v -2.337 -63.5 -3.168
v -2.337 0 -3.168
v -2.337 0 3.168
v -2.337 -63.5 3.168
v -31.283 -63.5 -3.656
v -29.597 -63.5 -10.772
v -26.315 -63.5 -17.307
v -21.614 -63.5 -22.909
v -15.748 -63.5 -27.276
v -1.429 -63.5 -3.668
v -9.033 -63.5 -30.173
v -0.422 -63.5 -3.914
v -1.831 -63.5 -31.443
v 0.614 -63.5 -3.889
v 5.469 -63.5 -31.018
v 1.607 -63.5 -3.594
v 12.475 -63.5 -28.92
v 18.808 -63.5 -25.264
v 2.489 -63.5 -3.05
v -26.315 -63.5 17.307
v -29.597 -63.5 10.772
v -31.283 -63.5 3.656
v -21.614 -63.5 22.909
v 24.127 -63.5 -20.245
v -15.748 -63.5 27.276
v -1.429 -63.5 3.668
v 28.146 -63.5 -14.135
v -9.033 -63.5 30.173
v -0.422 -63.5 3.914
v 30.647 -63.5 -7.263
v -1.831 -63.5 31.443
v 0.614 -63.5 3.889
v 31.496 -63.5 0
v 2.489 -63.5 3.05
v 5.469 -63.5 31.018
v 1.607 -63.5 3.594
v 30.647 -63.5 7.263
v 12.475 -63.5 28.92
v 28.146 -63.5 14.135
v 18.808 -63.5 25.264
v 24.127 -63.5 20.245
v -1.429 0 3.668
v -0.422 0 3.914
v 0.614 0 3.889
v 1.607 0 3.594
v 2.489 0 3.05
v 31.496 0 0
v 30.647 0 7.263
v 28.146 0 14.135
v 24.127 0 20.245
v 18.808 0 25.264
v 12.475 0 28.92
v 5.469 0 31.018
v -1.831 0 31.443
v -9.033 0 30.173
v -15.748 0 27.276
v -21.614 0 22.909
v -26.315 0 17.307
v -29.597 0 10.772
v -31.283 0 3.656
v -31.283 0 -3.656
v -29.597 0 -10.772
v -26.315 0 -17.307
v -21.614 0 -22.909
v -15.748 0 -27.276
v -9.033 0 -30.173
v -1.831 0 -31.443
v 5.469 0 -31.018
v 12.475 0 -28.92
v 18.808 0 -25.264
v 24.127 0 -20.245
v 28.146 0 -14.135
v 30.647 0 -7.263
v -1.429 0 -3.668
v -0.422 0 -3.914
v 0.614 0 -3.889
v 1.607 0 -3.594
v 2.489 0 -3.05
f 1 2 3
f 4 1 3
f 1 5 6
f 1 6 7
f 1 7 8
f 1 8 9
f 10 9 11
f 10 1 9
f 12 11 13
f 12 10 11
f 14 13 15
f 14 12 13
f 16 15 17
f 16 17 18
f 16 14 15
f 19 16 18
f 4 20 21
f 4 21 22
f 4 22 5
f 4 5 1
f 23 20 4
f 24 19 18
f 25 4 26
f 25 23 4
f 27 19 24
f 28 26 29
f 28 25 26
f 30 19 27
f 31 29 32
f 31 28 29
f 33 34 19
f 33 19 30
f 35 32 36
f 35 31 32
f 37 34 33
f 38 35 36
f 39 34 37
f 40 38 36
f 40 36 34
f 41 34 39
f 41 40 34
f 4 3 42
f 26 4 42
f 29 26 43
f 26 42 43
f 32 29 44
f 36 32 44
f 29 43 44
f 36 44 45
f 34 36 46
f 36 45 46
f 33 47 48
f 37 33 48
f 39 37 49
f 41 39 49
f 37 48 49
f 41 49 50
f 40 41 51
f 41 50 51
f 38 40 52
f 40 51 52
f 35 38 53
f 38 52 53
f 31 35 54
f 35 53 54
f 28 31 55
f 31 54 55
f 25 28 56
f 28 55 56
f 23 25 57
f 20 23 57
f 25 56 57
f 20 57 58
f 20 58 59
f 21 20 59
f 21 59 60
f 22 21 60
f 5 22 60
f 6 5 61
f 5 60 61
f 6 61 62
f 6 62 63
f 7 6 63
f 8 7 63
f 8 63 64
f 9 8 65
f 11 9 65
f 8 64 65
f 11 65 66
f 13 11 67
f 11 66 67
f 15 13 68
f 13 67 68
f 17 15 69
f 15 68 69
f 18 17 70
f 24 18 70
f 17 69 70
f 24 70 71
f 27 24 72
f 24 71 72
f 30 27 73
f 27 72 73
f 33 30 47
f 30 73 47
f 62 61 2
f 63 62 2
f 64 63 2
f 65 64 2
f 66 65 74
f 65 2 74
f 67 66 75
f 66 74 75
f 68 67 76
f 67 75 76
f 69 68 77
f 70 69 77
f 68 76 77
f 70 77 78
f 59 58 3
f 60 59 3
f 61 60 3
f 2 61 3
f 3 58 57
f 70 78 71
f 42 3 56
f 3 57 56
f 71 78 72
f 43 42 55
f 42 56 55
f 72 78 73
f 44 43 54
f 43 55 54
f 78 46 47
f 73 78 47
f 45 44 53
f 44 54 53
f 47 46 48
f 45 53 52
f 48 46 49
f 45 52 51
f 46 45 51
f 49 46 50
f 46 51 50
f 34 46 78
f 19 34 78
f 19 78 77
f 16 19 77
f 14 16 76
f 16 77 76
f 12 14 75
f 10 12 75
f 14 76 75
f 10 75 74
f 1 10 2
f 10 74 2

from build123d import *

# Parameters (mm, degrees)
F0_R     = 31.496
F1_DEPTH = 63.5
F2_DEPTH = 63.5
F3_DEPTH = 63.5


with BuildPart() as f1:
    # F0 (on Front) → F1 (new body)
    with BuildSketch(Plane.XZ):
        Circle(F0_R)
        with BuildLine():
            ThreePointArc((26.416, 0), (26.1371583003, -3.8280559015), (25.306519989, -7.5752955087))
            ThreePointArc((25.306519989, -7.5752955087), (22.8769270664, -13.208), (19.2136583462, -18.1284414375))
            ThreePointArc((19.2136583462, -18.1284414375), (0, -26.416), (-19.2136583462, -18.1284414375))
            ThreePointArc((-19.2136583462, -18.1284414375), (-22.9056297562, -13.1581602617), (-25.3392663756, -7.4650274981))
            ThreePointArc((-25.3392663756, -7.4650274981), (-22.8481158541, 13.2577772615), (-6.0928613417, 25.7037370176))
            ThreePointArc((-6.0928613417, 25.7037370176), (-4.8286381359, 25.9709320155), (-3.5528613417, 26.175985794))
            ThreePointArc((-3.5528613417, 26.175985794), (17.3774663113, 19.8954447199), (26.416, 0))
        make_face(mode=Mode.SUBTRACT)
    extrude(amount=F1_DEPTH)



with BuildPart() as f2:
    # F0 (on Front) → F2 (new body)
    with BuildSketch(Plane.XZ):
        with BuildLine():
            ThreePointArc((2.8770503286, -5.3743648375), (5.2297091125, -3.1323088287), (6.096, 0))
            ThreePointArc((6.096, 0), (5.3275135744, 2.9629065315), (3.2158113142, 5.1787810913))
            ThreePointArc((3.2158113142, 5.1787810913), (0.013272421, 6.0959855514), (-3.1932300386, 5.1927351098))
            ThreePointArc((-3.1932300386, 5.1927351098), (-3.3751638093, 5.0763653592), (-3.5528613417, 4.9536241568))
            ThreePointArc((-3.5528613417, 4.9536241568), (-5.3777045607, 2.8708029639), (-6.0928613417, 0.1955931265))
            ThreePointArc((-6.0928613417, 0.1955931265), (-5.2792932077, -3.0479959361), (-2.8770503286, -5.3743648375))
            ThreePointArc((-2.8770503286, -5.3743648375), (0, -6.096), (2.8770503286, -5.3743648375))
        make_face()
        with BuildLine():
            ThreePointArc((2.4892, 3.0502216903), (3.5566802921, 1.6881926134), (3.937, 0))
            ThreePointArc((3.937, 0), (3.5566802921, -1.6881926134), (2.4892, -3.0502216903))
            ThreePointArc((2.4892, -3.0502216903), (0.0964538394, -3.9358182957), (-2.3368, -3.1684909279))
            ThreePointArc((-2.3368, -3.1684909279), (-3.937, 0), (-2.3368, 3.1684909279))
            ThreePointArc((-2.3368, 3.1684909279), (0.0964538394, 3.9358182957), (2.4892, 3.0502216903))
        make_face(mode=Mode.SUBTRACT)
        with BuildLine():
            Line((-2.3368, -3.1684909279), (-2.3368, 3.1684909279))
            ThreePointArc((-2.3368, 3.1684909279), (-3.937, 0), (-2.3368, -3.1684909279))
        make_face()
        with BuildLine():
            ThreePointArc((2.4892, -3.0502216903), (3.5566802921, -1.6881926134), (3.937, 0))
            ThreePointArc((3.937, 0), (3.5566802921, 1.6881926134), (2.4892, 3.0502216903))
            Line((2.4892, 3.0502216903), (2.4892, -3.0502216903))
        make_face()
    extrude(amount=F2_DEPTH)


with BuildPart() as f1_1:
    add(f1.part)

    add(f2.part)  # F3 merges F2
    # F0 (on Front) → F3 (join)
    with BuildSketch(Plane.XZ):
        with BuildLine():
            Line((0, -7.0354306192), (2.8770503286, -5.3743648375))
            ThreePointArc((2.8770503286, -5.3743648375), (0, -6.096), (-2.8770503286, -5.3743648375))
            Line((-2.8770503286, -5.3743648375), (0, -7.0354306192))
        make_face()
        with BuildLine():
            Line((0, -7.0354306192), (-2.8770503286, -5.3743648375))
            ThreePointArc((-2.8770503286, -5.3743648375), (-5.2792932077, -3.0479959361), (-6.0928613417, 0.1955931265))
            Line((-6.0928613417, 0.1955931265), (-6.0928613417, 3.5354252361))
            Line((-6.0928613417, 3.5354252361), (-25.3392663756, -7.4650274981))
            ThreePointArc((-25.3392663756, -7.4650274981), (-22.9056297562, -13.1581602617), (-19.2136583462, -18.1284414375))
            Line((-19.2136583462, -18.1284414375), (0, -7.0354306192))
        make_face()
        with BuildLine():
            ThreePointArc((3.2158113142, 5.1787810913), (5.3275135744, 2.9629065315), (6.096, 0))
            ThreePointArc((6.096, 0), (5.2297091125, -3.1323088287), (2.8770503286, -5.3743648375))
            Line((2.8770503286, -5.3743648375), (0, -7.0354306192))
            Line((0, -7.0354306192), (19.2136583462, -18.1284414375))
            ThreePointArc((19.2136583462, -18.1284414375), (22.8769270664, -13.208), (25.306519989, -7.5752955087))
            Line((25.306519989, -7.5752955087), (3.2158113142, 5.1787810913))
        make_face()
        with BuildLine():
            ThreePointArc((-6.0928613417, 0.1955931265), (-5.3777045607, 2.8708029639), (-3.5528613417, 4.9536241568))
            Line((-3.5528613417, 4.9536241568), (-3.5528613417, 4.9871846631))
            Line((-3.5528613417, 4.9871846631), (-6.0928613417, 3.5354252361))
            Line((-6.0928613417, 3.5354252361), (-6.0928613417, 0.1955931265))
        make_face()
        with BuildLine():
            Line((-6.0928613417, 3.5354252361), (-3.5528613417, 4.9871846631))
            Line((-3.5528613417, 4.9871846631), (-3.5528613417, 26.175985794))
            ThreePointArc((-3.5528613417, 26.175985794), (-4.8286381359, 25.9709320155), (-6.0928613417, 25.7037370176))
            Line((-6.0928613417, 25.7037370176), (-6.0928613417, 3.5354252361))
        make_face()
        with BuildLine():
            Line((-25.3392663756, -7.4650274981), (-6.0928613417, 3.5354252361))
            Line((-6.0928613417, 3.5354252361), (-6.0928613417, 25.7037370176))
            ThreePointArc((-6.0928613417, 25.7037370176), (-22.8481158541, 13.2577772615), (-25.3392663756, -7.4650274981))
        make_face()
        with BuildLine():
            ThreePointArc((-3.1932300386, 5.1927351098), (0.013272421, 6.0959855514), (3.2158113142, 5.1787810913))
            Line((3.2158113142, 5.1787810913), (25.306519989, -7.5752955087))
            ThreePointArc((25.306519989, -7.5752955087), (26.1371583003, -3.8280559015), (26.416, 0))
            ThreePointArc((26.416, 0), (17.3774663113, 19.8954447199), (-3.5528613417, 26.175985794))
            Line((-3.5528613417, 26.175985794), (-3.5528613417, 4.9871846631))
            Line((-3.5528613417, 4.9871846631), (-3.1932300386, 5.1927351098))
        make_face()
        with BuildLine():
            ThreePointArc((-3.5528613417, 4.9536241568), (-3.3751638093, 5.0763653592), (-3.1932300386, 5.1927351098))
            Line((-3.1932300386, 5.1927351098), (-3.5528613417, 4.9871846631))
            Line((-3.5528613417, 4.9871846631), (-3.5528613417, 4.9536241568))
        make_face()
        with BuildLine():
            Line((19.2136583462, -18.1284414375), (0, -7.0354306192))
            Line((0, -7.0354306192), (-19.2136583462, -18.1284414375))
            ThreePointArc((-19.2136583462, -18.1284414375), (0, -26.416), (19.2136583462, -18.1284414375))
        make_face()
    extrude(amount=F3_DEPTH)


solid = f1_1.part
